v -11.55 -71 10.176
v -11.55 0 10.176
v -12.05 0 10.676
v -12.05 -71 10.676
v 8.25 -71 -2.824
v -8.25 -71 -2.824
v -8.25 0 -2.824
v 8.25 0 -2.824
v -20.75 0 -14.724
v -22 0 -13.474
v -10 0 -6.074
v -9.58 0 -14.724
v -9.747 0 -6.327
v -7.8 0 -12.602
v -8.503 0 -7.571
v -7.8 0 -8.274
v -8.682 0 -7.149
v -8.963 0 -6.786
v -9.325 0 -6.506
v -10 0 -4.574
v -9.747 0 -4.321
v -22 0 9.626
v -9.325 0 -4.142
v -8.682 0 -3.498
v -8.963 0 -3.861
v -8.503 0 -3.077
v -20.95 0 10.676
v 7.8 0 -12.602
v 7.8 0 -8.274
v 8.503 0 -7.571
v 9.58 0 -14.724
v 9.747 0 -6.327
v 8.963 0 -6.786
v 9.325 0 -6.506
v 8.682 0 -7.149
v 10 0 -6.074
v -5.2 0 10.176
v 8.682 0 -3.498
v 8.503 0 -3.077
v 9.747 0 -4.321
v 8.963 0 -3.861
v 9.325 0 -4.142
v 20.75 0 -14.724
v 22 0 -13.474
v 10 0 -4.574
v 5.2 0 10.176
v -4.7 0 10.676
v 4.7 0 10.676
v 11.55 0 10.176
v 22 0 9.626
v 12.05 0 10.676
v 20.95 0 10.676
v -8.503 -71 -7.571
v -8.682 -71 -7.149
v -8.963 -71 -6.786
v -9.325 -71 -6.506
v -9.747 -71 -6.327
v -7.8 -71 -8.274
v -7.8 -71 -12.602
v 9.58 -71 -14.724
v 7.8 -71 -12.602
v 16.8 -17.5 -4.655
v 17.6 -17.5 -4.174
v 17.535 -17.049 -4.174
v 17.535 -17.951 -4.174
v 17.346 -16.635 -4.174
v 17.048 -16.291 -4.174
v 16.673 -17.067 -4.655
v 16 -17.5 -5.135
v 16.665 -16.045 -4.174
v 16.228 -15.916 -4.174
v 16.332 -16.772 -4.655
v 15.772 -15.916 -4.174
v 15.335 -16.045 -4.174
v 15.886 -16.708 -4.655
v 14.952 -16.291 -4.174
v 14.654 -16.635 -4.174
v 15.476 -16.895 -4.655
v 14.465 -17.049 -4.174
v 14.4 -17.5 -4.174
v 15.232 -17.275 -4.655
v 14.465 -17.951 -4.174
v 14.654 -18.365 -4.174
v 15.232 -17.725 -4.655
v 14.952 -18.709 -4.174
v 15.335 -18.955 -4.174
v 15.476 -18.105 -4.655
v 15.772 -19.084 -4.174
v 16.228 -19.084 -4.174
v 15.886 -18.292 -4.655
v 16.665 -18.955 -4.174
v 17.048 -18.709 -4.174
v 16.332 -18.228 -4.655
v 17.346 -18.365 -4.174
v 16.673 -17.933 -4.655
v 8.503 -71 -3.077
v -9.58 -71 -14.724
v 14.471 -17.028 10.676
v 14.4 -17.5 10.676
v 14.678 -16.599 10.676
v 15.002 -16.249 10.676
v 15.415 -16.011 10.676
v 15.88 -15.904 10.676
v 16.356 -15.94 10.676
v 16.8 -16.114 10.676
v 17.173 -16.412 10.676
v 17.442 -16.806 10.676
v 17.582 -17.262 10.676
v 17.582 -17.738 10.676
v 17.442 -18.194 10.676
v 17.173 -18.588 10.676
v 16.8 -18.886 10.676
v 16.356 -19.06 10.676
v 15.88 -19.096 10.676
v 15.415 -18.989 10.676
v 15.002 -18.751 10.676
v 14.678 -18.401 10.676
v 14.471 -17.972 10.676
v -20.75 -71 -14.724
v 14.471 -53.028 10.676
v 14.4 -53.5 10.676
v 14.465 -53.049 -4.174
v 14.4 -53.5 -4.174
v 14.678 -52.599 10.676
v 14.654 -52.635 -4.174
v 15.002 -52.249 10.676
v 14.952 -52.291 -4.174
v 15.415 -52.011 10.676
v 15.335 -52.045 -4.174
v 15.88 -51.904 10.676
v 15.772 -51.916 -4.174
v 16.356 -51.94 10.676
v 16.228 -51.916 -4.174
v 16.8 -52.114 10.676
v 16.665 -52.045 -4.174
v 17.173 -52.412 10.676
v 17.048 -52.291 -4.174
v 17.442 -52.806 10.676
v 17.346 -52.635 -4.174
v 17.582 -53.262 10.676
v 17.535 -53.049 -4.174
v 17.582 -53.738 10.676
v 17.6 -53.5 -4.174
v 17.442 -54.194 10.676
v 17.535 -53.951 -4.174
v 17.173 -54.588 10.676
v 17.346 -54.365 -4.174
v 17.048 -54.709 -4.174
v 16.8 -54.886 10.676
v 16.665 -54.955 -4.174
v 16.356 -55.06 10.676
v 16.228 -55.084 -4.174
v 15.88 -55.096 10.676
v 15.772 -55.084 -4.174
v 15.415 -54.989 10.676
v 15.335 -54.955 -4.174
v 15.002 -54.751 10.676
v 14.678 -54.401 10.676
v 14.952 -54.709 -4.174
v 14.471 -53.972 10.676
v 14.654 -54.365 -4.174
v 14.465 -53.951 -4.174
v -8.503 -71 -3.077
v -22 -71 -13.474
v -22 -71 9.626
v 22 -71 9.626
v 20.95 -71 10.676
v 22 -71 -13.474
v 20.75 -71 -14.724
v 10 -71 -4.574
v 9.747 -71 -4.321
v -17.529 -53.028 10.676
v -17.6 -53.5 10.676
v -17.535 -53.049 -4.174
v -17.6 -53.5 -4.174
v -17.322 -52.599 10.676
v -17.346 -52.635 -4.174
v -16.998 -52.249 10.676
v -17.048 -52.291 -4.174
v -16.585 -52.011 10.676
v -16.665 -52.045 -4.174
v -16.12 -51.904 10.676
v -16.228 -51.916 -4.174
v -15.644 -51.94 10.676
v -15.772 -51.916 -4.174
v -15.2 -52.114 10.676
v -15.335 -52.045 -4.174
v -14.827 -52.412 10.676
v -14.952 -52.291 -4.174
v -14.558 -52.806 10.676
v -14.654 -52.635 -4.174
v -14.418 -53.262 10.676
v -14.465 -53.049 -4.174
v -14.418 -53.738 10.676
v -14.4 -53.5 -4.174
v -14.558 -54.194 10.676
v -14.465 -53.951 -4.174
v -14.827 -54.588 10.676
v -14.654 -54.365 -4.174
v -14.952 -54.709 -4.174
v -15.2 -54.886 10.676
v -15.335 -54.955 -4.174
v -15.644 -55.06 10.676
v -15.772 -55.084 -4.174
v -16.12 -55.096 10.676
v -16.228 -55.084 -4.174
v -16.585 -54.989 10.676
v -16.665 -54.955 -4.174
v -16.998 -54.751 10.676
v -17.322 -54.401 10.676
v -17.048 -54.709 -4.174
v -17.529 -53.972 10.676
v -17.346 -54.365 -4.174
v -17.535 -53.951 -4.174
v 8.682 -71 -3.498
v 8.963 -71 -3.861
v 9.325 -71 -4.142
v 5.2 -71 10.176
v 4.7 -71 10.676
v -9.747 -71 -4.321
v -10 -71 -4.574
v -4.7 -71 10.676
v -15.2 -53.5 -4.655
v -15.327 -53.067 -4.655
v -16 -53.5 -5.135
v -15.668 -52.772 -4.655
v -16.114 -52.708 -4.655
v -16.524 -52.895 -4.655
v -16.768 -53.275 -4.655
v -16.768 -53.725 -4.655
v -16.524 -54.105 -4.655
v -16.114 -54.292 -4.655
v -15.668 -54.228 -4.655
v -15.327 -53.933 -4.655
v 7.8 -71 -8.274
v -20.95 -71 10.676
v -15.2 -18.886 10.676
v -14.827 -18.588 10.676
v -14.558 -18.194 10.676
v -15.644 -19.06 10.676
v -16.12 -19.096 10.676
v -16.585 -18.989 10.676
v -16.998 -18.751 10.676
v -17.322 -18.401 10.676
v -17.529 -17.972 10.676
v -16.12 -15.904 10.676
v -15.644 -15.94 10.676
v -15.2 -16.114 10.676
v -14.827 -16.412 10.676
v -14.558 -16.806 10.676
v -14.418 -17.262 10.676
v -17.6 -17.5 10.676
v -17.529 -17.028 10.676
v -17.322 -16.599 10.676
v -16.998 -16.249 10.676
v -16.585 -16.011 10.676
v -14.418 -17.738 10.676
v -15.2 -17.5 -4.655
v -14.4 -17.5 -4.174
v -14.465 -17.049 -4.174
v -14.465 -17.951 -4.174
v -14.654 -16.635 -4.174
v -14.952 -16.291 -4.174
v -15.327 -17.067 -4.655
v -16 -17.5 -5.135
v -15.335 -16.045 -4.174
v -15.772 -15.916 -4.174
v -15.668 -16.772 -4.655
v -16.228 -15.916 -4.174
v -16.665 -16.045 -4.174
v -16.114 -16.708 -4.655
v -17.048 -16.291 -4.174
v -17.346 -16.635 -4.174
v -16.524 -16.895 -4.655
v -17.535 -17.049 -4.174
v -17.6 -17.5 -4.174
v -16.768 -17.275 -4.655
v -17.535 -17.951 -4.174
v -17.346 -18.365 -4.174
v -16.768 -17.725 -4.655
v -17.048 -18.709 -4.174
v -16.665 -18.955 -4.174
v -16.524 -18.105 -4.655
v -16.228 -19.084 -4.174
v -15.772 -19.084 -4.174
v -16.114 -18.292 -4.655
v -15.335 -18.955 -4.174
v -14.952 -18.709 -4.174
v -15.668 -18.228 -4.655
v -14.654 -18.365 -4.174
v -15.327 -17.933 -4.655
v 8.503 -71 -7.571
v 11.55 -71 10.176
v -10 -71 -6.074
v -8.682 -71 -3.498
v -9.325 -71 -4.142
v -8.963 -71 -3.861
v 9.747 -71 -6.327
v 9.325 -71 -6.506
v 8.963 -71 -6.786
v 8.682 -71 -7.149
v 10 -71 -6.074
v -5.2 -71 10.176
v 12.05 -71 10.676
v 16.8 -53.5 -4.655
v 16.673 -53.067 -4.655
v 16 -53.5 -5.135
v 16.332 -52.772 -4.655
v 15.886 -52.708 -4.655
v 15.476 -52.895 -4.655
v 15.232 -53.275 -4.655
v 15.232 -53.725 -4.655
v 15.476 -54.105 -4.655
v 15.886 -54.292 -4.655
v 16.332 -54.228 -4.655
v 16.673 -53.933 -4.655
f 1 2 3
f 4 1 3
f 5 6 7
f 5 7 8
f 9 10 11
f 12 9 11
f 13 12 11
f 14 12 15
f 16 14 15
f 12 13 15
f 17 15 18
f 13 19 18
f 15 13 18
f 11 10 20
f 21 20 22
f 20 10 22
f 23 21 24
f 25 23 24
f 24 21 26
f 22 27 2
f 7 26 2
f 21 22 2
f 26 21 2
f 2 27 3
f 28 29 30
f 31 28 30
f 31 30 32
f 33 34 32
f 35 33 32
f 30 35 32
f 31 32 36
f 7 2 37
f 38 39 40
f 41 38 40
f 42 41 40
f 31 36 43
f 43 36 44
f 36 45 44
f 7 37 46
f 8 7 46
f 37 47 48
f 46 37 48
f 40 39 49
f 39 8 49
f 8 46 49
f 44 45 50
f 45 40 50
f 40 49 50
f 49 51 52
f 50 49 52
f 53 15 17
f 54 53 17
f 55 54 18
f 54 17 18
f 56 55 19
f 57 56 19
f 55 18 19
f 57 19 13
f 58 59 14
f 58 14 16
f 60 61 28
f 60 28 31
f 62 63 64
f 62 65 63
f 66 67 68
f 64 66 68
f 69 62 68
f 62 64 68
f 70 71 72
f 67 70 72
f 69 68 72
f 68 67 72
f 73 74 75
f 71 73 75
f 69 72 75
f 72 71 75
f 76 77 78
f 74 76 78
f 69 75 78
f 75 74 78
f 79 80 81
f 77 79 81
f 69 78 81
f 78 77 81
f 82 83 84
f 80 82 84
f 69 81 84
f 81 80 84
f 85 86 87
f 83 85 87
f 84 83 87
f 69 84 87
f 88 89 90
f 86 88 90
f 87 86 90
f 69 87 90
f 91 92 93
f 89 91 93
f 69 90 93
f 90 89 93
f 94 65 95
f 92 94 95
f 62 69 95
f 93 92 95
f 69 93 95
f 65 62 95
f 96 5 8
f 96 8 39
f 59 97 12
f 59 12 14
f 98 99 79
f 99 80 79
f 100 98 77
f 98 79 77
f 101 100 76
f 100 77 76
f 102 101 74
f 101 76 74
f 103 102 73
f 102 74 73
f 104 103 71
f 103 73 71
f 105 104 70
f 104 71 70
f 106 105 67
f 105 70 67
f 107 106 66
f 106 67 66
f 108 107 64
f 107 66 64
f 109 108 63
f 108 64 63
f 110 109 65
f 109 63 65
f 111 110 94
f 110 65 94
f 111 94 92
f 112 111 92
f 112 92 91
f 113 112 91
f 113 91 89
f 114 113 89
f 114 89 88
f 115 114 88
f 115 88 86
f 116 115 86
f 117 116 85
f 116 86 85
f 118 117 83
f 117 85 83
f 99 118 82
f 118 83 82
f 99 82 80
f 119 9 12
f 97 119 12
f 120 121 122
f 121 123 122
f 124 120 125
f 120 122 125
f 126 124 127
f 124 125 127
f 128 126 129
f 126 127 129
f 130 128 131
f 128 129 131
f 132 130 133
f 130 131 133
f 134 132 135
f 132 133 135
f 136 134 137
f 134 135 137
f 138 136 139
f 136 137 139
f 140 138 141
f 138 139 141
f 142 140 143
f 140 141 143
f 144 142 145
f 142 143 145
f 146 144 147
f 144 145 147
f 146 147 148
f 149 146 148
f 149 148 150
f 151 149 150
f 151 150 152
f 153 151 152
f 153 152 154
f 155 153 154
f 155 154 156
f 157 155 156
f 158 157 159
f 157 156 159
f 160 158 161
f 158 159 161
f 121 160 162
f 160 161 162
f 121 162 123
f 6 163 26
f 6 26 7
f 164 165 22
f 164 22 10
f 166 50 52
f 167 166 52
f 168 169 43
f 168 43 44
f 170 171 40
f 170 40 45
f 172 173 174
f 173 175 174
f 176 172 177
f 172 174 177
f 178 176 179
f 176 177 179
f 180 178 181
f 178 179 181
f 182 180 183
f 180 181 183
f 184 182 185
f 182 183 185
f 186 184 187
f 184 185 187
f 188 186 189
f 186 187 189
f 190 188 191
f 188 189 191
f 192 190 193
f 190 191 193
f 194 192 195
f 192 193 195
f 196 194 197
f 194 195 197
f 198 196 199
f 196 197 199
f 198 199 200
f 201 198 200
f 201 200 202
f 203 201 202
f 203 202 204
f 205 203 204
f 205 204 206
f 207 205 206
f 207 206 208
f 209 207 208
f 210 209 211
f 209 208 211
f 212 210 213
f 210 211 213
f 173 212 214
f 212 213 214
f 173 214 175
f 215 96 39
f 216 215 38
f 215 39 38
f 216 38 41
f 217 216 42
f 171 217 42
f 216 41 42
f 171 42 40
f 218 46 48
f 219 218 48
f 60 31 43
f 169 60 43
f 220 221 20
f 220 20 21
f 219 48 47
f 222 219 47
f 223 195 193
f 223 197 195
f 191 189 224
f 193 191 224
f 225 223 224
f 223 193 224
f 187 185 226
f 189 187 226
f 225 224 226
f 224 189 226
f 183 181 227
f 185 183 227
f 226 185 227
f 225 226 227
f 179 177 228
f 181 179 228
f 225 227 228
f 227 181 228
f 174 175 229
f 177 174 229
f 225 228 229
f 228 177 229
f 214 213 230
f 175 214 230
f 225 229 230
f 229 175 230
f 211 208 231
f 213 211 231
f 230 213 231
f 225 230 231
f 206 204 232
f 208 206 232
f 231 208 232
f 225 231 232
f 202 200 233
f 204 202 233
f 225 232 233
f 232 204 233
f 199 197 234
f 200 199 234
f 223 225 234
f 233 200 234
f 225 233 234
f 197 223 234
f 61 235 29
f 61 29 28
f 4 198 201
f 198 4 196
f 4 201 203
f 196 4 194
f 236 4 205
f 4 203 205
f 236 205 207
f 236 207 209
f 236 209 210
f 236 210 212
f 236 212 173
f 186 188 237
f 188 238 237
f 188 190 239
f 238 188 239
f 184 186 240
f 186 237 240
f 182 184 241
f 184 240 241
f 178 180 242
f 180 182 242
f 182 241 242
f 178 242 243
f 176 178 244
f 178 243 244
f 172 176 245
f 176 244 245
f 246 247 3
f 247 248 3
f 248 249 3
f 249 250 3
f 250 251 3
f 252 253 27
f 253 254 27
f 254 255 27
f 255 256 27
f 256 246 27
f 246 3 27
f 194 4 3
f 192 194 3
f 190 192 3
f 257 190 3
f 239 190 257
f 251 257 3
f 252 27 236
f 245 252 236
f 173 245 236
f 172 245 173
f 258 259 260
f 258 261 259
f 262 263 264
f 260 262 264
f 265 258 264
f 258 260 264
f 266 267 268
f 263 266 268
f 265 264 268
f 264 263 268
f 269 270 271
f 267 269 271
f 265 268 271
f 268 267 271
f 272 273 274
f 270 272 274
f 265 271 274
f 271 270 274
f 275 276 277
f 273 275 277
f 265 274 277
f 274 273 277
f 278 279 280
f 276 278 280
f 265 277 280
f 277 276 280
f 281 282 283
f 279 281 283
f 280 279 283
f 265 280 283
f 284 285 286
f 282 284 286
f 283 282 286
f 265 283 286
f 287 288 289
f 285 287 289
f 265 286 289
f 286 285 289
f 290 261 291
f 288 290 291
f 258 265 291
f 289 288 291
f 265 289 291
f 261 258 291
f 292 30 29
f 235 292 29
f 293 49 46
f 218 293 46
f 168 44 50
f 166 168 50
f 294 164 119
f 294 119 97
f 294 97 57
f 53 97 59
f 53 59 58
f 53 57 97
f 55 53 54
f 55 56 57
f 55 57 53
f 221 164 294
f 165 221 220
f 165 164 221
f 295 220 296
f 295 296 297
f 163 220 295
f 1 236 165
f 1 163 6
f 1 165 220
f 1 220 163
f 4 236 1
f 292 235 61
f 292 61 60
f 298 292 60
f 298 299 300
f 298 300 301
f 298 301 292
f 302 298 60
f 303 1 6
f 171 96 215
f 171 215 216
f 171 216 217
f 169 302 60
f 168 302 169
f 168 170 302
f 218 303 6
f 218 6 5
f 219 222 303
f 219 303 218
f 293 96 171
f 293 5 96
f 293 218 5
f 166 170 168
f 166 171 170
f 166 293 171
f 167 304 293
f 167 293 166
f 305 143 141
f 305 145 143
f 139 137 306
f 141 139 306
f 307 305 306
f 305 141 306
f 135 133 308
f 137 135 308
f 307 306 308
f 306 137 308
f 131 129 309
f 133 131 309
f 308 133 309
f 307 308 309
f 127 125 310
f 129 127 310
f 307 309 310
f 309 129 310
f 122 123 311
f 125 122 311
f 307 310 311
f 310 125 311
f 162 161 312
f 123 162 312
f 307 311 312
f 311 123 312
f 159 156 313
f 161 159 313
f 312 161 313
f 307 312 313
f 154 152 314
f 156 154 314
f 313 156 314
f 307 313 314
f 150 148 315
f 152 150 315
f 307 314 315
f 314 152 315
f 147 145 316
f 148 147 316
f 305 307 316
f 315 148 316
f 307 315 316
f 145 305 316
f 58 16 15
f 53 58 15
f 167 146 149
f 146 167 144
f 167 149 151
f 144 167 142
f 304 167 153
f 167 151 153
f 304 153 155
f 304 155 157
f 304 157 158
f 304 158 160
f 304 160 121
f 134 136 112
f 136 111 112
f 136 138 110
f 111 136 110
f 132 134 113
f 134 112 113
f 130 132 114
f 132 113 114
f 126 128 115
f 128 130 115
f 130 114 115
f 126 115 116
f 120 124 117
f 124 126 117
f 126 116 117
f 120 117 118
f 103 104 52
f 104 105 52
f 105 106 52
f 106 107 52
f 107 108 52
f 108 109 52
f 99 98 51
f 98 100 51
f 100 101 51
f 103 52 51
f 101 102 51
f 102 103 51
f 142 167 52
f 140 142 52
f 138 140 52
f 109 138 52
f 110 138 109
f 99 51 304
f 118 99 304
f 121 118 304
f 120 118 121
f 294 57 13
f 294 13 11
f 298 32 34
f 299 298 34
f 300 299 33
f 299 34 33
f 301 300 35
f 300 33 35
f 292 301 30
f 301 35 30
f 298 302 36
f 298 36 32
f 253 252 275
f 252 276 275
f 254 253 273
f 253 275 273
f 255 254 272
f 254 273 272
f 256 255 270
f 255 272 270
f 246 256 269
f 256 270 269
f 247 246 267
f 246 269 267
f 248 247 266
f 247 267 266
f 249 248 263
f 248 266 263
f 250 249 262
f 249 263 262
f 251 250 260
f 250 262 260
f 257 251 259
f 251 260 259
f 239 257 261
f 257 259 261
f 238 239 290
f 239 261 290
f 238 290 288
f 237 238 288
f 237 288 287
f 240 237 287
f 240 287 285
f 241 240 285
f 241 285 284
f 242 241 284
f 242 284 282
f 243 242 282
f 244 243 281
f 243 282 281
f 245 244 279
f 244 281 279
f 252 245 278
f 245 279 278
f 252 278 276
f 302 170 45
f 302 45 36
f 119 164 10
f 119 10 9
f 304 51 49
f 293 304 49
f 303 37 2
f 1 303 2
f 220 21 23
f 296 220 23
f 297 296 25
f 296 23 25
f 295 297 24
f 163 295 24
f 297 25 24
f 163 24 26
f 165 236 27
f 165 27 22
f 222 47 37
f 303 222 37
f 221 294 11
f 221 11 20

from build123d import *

# Parameters (mm, degrees)
F1_DEPTH = 71
F3_D     = 3.2
F3_DEPTH = 14.85
F3_TIP   = 0.9613769904


with BuildPart() as f1:
    # F0 (on Front) → F1 (new body)
    with BuildSketch(Plane.XZ):
        with BuildLine():
            Line((22.000012, -13.4738130626), (22.000012, 0.9761649373))
            Line((22.000012, 0.9761649373), (22.000012, 9.6261749373))
            Line((22.000012, 9.6261749373), (20.950012, 10.6761749374))
            Line((20.950012, 10.6761749374), (12.049988, 10.6761749373))
            Line((12.049988, 10.6761749373), (11.549988, 10.1761749373))
            Line((11.549988, 10.1761749373), (5.2, 10.1761749373))
            Line((5.2, 10.1761749373), (4.7, 10.6761749373))
            Line((4.7, 10.6761749373), (-4.7, 10.6761749373))
            Line((-4.7, 10.6761749373), (-5.2, 10.1761749373))
            Line((-5.2, 10.1761749373), (-11.549988, 10.1761749373))
            Line((-11.549988, 10.1761749373), (-12.049988, 10.6761749373))
            Line((-12.049988, 10.6761749373), (-20.950012, 10.6761749373))
            Line((-20.950012, 10.6761749373), (-22.000012, 9.6261749373))
            Line((-22.000012, 9.6261749373), (-22.000012, 0.9761649373))
            Line((-22.000012, 0.9761649373), (-22.000012, -13.4738130627))
            Line((-22.000012, -13.4738130627), (-20.75, -14.7238250627))
            Line((-20.75, -14.7238250627), (-9.5804297104, -14.7238250627))
            Line((-9.5804297104, -14.7238250627), (-7.8, -12.601991559))
            Line((-7.8, -12.601991559), (-7.8, -8.2738250627))
            Line((-7.8, -8.2738250627), (-8.502817534, -7.5710075287))
            ThreePointArc((-8.502817534, -7.5710075287), (-8.962563133, -6.7863881956), (-9.7471824661, -6.3266425966))
            Line((-9.7471824661, -6.3266425966), (-10, -6.0738250627))
            Line((-10, -6.0738250627), (-10, -4.5738250627))
            Line((-10, -4.5738250627), (-9.747182466, -4.3210075287))
            ThreePointArc((-9.747182466, -4.3210075287), (-8.962563133, -3.8612619297), (-8.502817534, -3.0766425966))
            Line((-8.502817534, -3.0766425966), (-8.25, -2.8238250627))
            Line((-8.25, -2.8238250627), (8.25, -2.8238250628))
            Line((8.25, -2.8238250628), (8.502817534, -3.0766425968))
            ThreePointArc((8.502817534, -3.0766425968), (8.9625631329, -3.8612619298), (9.747182466, -4.3210075287))
            Line((9.747182466, -4.3210075287), (10, -4.5738250627))
            Line((10, -4.5738250627), (10, -6.0738250627))
            Line((10, -6.0738250627), (9.747182466, -6.3266425966))
            ThreePointArc((9.747182466, -6.3266425966), (8.9625631329, -6.7863881956), (8.5028175339, -7.5710075287))
            Line((8.5028175339, -7.5710075287), (7.8, -8.2738250627))
            Line((7.8, -8.2738250627), (7.8, -12.601991559))
            Line((7.8, -12.601991559), (9.5804297104, -14.7238250627))
            Line((9.5804297104, -14.7238250627), (20.75, -14.7238250627))
            Line((20.75, -14.7238250627), (22.000012, -13.4738130626))
        make_face()
    extrude(amount=F1_DEPTH)

    # F3
    with Locations(Plane.XY.offset(10.6761749373)):
        with Locations((-16, -17.5), (-16, -53.5), (16, -53.5), (16, -17.5)):
            Hole(F3_D / 2, depth=F3_DEPTH)
            with Locations((0, 0, -(F3_DEPTH + F3_TIP / 2))):  # 118° drill point
                Cone(0, F3_D / 2, F3_TIP, mode=Mode.SUBTRACT)


solid = f1.part
